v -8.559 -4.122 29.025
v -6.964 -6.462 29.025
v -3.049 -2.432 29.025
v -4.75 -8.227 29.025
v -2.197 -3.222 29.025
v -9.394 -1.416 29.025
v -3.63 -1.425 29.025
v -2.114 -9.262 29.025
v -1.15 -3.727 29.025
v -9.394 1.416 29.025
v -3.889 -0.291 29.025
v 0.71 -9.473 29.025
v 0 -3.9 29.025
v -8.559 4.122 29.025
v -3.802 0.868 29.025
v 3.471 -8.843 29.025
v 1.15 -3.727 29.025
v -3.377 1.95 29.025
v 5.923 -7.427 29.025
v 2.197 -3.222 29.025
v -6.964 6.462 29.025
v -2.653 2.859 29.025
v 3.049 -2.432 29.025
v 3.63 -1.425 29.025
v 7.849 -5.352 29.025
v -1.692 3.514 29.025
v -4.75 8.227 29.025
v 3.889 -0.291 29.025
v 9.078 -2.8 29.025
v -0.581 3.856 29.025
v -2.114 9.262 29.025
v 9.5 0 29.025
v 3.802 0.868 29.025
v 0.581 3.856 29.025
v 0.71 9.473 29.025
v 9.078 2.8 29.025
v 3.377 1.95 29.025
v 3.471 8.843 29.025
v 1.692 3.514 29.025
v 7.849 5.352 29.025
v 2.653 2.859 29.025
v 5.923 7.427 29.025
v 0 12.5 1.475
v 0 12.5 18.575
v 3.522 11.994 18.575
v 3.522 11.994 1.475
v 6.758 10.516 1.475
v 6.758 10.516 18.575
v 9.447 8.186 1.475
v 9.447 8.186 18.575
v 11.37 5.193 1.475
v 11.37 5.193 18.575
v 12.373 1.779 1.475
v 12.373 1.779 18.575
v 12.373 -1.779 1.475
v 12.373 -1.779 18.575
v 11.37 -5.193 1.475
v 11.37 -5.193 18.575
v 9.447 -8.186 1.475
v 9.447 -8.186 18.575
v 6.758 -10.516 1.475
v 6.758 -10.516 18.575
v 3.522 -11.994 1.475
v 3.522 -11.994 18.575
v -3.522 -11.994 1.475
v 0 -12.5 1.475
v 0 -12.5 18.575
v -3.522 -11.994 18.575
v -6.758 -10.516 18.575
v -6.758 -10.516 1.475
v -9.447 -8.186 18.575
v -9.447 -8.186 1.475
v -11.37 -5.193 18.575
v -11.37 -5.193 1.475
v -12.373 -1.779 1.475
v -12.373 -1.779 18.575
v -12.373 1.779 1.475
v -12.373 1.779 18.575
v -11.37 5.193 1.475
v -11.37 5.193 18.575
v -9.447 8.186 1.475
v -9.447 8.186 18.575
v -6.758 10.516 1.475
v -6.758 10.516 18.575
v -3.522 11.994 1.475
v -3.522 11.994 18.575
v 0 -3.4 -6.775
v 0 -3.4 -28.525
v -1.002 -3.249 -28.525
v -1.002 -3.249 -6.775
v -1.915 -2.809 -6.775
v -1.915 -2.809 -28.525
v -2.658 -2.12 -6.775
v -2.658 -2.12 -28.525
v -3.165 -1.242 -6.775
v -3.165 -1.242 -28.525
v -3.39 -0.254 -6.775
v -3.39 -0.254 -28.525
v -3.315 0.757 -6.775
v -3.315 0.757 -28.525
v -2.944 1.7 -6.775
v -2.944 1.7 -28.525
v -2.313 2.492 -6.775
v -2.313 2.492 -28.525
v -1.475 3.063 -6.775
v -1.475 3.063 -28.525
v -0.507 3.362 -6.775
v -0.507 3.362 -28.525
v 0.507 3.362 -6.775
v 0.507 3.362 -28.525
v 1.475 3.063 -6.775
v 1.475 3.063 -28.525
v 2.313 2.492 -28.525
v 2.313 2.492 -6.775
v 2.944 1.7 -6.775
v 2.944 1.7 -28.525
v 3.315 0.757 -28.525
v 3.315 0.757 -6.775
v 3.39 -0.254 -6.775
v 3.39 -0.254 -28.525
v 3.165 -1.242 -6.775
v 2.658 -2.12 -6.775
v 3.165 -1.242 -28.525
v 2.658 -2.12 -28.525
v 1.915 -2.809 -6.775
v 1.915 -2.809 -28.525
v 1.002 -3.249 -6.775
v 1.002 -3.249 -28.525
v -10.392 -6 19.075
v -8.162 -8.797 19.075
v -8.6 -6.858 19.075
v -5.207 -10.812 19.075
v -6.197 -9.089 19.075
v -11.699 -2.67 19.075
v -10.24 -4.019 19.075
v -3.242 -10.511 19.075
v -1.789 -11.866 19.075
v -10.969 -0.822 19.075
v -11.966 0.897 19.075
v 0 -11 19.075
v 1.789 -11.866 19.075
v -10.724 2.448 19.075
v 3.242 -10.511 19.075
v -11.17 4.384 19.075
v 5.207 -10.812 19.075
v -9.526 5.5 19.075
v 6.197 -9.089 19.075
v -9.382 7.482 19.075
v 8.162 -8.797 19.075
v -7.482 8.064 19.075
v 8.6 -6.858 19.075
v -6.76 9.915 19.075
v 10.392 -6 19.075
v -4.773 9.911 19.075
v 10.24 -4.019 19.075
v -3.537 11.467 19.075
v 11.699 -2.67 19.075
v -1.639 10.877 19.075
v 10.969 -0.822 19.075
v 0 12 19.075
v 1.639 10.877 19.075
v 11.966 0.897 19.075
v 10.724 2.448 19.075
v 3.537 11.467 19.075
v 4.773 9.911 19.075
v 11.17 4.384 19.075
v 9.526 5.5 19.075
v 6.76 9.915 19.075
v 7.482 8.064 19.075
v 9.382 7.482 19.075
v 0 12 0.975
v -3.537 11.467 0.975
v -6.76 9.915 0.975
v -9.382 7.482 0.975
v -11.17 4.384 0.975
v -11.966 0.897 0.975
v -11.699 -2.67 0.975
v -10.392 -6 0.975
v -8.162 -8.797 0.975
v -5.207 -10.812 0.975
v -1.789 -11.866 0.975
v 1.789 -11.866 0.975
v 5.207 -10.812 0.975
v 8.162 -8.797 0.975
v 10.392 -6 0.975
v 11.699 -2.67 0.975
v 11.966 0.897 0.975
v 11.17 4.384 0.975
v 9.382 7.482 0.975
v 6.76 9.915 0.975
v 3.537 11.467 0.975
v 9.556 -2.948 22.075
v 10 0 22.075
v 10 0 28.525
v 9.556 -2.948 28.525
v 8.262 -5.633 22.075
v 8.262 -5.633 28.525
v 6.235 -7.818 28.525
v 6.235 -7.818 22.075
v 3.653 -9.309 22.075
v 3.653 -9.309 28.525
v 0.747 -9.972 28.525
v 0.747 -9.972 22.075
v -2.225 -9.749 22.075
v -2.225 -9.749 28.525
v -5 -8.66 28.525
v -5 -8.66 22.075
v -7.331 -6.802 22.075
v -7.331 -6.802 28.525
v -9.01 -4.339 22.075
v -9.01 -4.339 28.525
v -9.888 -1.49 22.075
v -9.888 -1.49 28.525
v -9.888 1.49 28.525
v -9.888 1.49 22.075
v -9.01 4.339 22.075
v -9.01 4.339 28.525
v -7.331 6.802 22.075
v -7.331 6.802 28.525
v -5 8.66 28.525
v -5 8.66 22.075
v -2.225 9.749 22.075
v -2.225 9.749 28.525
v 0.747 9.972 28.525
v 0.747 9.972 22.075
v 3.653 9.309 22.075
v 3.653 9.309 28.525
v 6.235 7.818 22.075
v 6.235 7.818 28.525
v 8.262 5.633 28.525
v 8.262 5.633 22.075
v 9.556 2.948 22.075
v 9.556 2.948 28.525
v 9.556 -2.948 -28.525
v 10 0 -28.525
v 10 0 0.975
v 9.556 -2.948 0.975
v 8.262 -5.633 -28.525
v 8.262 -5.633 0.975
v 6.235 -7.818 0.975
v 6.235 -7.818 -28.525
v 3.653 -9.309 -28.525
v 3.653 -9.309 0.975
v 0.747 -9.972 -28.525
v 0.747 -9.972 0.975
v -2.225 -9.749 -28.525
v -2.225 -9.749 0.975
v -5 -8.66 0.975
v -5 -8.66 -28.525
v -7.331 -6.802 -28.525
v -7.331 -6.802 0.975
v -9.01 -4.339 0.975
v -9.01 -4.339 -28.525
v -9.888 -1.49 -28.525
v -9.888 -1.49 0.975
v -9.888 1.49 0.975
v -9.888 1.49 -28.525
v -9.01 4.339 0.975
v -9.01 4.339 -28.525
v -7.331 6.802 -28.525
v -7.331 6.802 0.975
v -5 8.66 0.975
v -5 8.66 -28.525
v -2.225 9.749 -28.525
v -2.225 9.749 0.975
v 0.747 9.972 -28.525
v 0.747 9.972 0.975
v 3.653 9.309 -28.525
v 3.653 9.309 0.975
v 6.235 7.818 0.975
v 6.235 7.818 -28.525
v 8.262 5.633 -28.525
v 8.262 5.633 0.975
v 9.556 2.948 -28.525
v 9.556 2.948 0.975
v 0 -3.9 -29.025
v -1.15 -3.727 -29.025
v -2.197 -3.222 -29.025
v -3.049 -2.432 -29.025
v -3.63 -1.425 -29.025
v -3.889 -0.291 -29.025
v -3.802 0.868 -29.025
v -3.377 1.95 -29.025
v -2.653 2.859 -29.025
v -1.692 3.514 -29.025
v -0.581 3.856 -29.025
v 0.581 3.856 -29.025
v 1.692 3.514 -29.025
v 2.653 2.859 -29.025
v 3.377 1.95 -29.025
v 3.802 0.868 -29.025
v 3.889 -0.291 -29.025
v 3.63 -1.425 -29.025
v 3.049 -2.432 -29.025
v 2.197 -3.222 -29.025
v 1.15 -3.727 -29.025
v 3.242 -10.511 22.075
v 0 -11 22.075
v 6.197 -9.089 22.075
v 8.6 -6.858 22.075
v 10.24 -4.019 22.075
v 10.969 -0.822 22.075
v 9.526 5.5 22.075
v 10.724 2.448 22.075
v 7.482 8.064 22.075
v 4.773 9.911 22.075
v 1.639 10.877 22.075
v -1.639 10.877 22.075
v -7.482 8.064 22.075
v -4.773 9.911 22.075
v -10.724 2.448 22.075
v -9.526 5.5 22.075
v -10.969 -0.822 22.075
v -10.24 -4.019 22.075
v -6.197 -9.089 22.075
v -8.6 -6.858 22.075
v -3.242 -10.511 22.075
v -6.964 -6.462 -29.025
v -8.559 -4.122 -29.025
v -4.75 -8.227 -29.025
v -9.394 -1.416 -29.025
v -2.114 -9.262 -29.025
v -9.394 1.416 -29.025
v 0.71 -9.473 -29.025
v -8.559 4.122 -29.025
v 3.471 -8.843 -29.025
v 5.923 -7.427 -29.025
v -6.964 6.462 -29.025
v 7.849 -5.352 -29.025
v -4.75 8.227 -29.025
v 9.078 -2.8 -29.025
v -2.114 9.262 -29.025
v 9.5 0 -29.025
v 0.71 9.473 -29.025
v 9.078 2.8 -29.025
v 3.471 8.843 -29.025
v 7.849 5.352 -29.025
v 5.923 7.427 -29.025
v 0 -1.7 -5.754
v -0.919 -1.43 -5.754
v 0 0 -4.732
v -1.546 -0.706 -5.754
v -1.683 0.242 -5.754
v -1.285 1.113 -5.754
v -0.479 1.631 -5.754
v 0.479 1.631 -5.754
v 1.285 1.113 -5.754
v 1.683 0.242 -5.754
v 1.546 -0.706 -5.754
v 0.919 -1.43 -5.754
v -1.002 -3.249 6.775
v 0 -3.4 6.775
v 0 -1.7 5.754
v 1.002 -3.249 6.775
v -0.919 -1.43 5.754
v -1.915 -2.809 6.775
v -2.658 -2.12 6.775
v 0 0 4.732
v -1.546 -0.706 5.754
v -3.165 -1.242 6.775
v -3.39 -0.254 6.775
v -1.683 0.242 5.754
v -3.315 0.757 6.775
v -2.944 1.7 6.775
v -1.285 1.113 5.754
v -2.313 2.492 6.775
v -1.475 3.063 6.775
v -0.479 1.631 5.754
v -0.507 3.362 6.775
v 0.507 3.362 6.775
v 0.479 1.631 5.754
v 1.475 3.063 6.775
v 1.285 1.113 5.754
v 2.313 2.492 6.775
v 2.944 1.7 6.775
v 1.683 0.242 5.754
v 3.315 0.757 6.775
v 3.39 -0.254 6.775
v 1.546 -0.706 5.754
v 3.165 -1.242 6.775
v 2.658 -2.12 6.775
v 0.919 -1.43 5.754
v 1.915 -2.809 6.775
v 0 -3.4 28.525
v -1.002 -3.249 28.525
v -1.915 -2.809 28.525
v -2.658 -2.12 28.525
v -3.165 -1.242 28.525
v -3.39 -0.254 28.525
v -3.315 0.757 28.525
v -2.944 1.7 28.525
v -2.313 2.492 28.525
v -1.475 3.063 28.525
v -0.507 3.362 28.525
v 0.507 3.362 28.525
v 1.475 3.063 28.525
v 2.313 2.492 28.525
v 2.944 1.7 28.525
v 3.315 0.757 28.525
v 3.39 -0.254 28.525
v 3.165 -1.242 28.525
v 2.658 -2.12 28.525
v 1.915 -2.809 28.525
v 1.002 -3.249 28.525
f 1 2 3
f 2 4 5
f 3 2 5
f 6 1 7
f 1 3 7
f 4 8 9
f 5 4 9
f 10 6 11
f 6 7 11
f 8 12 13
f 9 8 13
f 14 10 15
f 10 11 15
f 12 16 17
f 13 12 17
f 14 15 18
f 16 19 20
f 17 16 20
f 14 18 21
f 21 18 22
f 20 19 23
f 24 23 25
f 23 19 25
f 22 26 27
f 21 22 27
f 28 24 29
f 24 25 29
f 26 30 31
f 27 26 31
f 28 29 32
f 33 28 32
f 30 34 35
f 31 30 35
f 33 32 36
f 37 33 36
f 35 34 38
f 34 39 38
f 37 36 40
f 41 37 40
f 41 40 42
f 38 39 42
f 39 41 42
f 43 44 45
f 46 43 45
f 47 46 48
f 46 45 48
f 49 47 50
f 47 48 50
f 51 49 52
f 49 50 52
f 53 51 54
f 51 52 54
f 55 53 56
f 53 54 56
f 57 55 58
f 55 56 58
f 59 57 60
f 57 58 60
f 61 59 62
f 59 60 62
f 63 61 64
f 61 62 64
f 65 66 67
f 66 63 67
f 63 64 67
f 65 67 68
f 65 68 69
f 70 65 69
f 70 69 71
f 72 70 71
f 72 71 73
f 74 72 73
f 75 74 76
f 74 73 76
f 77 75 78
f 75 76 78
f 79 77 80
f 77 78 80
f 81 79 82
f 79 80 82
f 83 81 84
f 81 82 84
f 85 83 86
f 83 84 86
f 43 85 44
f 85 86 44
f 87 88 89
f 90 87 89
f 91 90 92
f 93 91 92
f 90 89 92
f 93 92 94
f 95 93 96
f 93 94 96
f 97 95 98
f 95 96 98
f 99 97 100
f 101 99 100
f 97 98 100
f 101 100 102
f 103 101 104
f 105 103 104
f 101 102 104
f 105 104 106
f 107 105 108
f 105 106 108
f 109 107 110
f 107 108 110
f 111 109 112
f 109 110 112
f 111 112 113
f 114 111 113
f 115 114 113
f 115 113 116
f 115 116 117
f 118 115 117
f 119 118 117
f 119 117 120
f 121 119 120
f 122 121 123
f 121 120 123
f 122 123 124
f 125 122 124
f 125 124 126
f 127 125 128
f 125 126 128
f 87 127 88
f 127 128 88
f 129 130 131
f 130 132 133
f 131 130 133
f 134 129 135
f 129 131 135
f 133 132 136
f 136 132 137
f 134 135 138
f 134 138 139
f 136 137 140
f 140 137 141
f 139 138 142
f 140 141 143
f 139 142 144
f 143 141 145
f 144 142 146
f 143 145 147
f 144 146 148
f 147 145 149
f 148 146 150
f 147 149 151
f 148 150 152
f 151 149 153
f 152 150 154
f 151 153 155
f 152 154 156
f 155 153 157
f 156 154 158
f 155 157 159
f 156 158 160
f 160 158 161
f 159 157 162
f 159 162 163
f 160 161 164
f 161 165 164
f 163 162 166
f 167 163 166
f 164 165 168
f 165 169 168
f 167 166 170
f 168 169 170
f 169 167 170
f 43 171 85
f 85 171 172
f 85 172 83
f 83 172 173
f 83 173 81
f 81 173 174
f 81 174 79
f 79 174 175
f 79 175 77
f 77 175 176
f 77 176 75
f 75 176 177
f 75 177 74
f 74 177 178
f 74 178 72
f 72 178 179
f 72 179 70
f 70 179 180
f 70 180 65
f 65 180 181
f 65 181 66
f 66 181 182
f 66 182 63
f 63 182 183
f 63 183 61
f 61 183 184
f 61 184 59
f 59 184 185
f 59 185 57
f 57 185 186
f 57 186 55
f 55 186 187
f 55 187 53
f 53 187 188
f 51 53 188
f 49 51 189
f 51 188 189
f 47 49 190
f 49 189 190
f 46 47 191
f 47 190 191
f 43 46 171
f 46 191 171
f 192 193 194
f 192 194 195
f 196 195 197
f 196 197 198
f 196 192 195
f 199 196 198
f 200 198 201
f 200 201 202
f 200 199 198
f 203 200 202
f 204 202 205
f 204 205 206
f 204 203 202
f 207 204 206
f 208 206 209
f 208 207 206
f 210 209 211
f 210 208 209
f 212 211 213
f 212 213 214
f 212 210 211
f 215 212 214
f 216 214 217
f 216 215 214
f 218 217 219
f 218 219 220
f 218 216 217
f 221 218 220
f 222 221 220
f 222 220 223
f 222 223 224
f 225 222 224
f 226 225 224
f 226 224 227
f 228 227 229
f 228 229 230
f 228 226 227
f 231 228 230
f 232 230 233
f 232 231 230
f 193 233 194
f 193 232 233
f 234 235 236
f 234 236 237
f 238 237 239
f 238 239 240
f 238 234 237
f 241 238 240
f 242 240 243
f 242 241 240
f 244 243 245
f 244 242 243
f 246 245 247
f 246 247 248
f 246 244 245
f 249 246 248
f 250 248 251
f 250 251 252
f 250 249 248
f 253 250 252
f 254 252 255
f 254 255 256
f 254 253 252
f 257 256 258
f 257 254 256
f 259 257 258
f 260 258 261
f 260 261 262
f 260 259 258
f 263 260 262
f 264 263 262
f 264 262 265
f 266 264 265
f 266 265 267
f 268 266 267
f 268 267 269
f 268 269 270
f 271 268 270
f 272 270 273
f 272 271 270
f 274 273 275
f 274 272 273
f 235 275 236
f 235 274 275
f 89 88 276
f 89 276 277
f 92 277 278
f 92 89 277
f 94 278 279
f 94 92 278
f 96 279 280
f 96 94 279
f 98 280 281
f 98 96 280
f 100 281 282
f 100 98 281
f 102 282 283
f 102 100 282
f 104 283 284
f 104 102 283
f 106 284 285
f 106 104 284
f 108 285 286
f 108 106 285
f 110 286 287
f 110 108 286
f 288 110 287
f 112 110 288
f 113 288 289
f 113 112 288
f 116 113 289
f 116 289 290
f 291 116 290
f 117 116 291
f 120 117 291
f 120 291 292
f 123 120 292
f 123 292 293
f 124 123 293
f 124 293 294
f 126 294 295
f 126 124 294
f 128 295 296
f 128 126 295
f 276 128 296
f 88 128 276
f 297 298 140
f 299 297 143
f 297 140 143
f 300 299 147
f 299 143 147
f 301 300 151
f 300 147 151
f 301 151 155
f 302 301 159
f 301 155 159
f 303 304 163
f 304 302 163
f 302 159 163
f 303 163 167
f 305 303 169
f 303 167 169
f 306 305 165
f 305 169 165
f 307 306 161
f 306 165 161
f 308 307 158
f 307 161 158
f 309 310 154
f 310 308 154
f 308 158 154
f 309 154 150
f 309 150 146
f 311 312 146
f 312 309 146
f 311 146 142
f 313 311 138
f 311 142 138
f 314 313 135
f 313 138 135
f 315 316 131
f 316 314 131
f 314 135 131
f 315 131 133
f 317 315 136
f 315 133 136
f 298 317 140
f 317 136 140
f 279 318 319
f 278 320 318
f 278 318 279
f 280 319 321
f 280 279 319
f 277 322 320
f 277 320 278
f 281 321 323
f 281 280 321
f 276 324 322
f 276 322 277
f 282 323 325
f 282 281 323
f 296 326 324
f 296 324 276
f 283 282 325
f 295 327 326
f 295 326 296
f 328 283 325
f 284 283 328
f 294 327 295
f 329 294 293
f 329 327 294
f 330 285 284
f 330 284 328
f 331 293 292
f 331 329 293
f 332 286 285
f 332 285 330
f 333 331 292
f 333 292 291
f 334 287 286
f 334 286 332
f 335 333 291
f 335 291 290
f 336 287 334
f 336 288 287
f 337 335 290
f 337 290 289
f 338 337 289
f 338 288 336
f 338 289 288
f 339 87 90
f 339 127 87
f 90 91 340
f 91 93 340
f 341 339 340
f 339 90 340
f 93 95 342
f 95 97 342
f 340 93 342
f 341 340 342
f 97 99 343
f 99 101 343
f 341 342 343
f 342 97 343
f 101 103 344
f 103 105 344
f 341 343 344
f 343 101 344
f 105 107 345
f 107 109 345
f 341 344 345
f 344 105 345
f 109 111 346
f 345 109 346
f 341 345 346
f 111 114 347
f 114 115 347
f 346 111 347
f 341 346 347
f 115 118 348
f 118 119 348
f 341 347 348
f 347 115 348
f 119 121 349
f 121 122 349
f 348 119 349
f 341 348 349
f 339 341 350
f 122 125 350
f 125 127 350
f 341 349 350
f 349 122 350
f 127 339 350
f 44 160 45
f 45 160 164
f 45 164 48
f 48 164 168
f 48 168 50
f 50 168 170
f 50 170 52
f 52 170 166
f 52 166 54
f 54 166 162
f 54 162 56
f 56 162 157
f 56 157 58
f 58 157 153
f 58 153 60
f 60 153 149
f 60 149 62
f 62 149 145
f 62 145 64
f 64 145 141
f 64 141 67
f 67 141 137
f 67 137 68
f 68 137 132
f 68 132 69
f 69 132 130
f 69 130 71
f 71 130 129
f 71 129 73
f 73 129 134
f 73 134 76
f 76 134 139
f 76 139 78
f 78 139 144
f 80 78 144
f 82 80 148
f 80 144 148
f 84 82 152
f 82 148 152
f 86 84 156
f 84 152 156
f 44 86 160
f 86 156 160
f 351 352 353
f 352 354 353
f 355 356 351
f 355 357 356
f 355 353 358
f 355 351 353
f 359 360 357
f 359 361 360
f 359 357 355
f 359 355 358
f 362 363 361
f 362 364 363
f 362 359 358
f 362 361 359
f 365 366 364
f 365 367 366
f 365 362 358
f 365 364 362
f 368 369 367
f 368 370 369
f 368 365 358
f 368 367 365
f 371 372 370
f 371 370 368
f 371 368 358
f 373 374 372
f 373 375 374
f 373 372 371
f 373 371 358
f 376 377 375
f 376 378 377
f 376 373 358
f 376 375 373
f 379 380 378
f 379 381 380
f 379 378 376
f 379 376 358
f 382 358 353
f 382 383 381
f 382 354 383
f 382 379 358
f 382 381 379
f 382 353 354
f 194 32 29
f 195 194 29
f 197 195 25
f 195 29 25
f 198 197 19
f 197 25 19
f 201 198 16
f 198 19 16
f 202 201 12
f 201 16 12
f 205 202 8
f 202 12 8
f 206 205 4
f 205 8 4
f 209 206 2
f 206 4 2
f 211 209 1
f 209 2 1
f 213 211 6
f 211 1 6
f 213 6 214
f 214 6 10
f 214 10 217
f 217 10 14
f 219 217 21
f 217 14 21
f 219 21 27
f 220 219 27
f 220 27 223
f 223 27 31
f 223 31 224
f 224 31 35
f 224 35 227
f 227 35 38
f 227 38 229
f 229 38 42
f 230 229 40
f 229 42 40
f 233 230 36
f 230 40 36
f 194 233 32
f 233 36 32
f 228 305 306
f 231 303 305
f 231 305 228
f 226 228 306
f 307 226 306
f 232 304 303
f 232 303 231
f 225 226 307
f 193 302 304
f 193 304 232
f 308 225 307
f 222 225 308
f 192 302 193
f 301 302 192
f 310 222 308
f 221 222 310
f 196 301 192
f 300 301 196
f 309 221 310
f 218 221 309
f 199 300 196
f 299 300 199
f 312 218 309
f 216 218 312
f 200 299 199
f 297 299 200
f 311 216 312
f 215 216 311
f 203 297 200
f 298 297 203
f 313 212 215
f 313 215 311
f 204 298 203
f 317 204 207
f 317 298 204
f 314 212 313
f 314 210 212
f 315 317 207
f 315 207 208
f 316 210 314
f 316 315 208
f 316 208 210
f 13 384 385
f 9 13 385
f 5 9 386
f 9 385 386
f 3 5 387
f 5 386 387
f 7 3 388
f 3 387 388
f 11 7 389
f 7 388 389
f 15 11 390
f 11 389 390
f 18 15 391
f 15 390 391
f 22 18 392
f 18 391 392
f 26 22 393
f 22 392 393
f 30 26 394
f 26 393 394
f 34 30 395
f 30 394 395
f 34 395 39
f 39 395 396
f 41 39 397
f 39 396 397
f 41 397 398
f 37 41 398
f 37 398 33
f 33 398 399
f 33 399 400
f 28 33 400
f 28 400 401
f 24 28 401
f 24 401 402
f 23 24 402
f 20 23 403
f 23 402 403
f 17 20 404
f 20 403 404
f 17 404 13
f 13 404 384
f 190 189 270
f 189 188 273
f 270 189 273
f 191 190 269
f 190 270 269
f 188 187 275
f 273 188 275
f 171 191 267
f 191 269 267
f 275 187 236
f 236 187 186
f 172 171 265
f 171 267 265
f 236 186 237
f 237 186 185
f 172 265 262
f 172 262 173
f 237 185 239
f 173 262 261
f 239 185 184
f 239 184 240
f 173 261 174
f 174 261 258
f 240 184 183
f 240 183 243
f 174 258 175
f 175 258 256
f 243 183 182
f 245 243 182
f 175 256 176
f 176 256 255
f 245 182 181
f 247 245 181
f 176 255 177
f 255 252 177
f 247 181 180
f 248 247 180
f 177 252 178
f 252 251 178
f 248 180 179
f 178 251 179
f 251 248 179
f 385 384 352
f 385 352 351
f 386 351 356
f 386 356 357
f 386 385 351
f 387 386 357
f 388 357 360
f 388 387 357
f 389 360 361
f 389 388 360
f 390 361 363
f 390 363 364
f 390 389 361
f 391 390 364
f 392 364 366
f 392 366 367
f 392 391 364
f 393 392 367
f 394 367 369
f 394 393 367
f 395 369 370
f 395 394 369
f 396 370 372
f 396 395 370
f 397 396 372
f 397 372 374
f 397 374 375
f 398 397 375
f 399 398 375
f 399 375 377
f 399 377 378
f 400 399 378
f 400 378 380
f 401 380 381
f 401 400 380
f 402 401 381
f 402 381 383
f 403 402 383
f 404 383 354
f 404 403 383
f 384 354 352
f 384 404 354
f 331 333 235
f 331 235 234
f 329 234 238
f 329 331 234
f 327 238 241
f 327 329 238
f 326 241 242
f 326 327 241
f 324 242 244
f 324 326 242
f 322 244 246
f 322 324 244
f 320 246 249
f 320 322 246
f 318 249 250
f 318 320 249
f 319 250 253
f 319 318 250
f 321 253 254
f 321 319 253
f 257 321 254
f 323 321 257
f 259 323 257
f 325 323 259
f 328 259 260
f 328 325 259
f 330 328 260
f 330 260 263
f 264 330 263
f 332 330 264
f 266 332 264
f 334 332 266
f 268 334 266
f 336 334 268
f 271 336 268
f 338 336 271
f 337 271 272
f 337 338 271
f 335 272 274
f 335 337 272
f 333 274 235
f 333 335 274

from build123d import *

# Parameters (mm, degrees)
SKETCH1_R                     = 12.5
MIL_CONFIGURED_CAP_25_1_DEPTH = 58.05
IZIM3_W                       = 30
IZIM3_H                       = 2.5
IZIM3_W_2                     = 6.95
PAH1_SIZE                     = 0.5
PAH2_SIZE                     = 1.5
IZIM6_W                       = 3
IZIM6_H                       = 1.5
PAH3_SIZE                     = 0.5


with BuildPart() as part:
    # Sketch1 → Mil - configured CAP=25(1) (new body)
    with BuildSketch(Plane.YX.offset(-29.025)):
        Circle(SKETCH1_R)
    extrude(amount=MIL_CONFIGURED_CAP_25_1_DEPTH)

    # Çizim3 → Kes-Döndür1 (revolve, cut)
    with BuildSketch(Plane(origin=(0, 0, 0), x_dir=(0, 0, -1), z_dir=(1, 0, 0)), mode=Mode.PRIVATE) as kes_d_nd_r1_sk:
        with Locations((14.025, 11.25)):
            Rectangle(IZIM3_W, IZIM3_H)
        with Locations((-25.55, 11.25)):
            Rectangle(IZIM3_W_2, IZIM3_H)
    revolve(kes_d_nd_r1_sk.sketch.rotate(Axis((0, 0, -29.025), (0, 0, -1)), 90), axis=Axis((0, 0, -29.025), (0, 0, -1)), mode=Mode.SUBTRACT)

    # Çizim4 → M8 Dişli Delik1 (revolve, cut)
    with BuildSketch(Plane(origin=(0, 0, 29.025), x_dir=(0, -1, 0), z_dir=(1, 0, 0))):
        Polygon((0, 0), (0, 24.292926105), (3.4, 22.25), (3.4, 0), align=None)
    m8_di_li_delik1 = revolve(axis=Axis((0, 0, 35.375), (0, 0, -1)), mode=Mode.SUBTRACT)

    # Aynalama1: M8 Dişli Delik1 across plane
    add(m8_di_li_delik1.mirror(Plane.XY), mode=Mode.SUBTRACT)

    # Pah1
    pah1_edges = [part.edges().sort_by_distance(p)[0] for p in [
        (-10, 0, 29.025),
        (0, 3.4, 29.025),
        (0, 3.4, -29.025),
        (-10, 0, -29.025),
        (0, -12.5, 0.975),
    ]]
    chamfer(pah1_edges, length=PAH1_SIZE)

    # Pah2
    pah2_edges = [part.edges().sort_by_distance(p)[0] for p in [
        (0, -12.5, 22.075),
    ]]
    chamfer(pah2_edges, length=PAH2_SIZE)

    # Çizim6 → Kes-Döndür2 (revolve, cut)
    with BuildSketch(Plane(origin=(0, 0, 0), x_dir=(0, 0, -1), z_dir=(1, 0, 0)), mode=Mode.PRIVATE) as kes_d_nd_r2_sk:
        with Locations((-20.575, 11.75)):
            Rectangle(IZIM6_W, IZIM6_H)
    revolve(kes_d_nd_r2_sk.sketch.rotate(Axis((0, 0, 29.025), (0, 0, 1)), 180), axis=Axis((0, 0, 29.025), (0, 0, 1)), mode=Mode.SUBTRACT)

    # Pah3
    pah3_edges = [part.edges().sort_by_distance(p)[0] for p in [
        (0, -12.5, 19.075),
    ]]
    chamfer(pah3_edges, length=PAH3_SIZE)


solid = part.part
